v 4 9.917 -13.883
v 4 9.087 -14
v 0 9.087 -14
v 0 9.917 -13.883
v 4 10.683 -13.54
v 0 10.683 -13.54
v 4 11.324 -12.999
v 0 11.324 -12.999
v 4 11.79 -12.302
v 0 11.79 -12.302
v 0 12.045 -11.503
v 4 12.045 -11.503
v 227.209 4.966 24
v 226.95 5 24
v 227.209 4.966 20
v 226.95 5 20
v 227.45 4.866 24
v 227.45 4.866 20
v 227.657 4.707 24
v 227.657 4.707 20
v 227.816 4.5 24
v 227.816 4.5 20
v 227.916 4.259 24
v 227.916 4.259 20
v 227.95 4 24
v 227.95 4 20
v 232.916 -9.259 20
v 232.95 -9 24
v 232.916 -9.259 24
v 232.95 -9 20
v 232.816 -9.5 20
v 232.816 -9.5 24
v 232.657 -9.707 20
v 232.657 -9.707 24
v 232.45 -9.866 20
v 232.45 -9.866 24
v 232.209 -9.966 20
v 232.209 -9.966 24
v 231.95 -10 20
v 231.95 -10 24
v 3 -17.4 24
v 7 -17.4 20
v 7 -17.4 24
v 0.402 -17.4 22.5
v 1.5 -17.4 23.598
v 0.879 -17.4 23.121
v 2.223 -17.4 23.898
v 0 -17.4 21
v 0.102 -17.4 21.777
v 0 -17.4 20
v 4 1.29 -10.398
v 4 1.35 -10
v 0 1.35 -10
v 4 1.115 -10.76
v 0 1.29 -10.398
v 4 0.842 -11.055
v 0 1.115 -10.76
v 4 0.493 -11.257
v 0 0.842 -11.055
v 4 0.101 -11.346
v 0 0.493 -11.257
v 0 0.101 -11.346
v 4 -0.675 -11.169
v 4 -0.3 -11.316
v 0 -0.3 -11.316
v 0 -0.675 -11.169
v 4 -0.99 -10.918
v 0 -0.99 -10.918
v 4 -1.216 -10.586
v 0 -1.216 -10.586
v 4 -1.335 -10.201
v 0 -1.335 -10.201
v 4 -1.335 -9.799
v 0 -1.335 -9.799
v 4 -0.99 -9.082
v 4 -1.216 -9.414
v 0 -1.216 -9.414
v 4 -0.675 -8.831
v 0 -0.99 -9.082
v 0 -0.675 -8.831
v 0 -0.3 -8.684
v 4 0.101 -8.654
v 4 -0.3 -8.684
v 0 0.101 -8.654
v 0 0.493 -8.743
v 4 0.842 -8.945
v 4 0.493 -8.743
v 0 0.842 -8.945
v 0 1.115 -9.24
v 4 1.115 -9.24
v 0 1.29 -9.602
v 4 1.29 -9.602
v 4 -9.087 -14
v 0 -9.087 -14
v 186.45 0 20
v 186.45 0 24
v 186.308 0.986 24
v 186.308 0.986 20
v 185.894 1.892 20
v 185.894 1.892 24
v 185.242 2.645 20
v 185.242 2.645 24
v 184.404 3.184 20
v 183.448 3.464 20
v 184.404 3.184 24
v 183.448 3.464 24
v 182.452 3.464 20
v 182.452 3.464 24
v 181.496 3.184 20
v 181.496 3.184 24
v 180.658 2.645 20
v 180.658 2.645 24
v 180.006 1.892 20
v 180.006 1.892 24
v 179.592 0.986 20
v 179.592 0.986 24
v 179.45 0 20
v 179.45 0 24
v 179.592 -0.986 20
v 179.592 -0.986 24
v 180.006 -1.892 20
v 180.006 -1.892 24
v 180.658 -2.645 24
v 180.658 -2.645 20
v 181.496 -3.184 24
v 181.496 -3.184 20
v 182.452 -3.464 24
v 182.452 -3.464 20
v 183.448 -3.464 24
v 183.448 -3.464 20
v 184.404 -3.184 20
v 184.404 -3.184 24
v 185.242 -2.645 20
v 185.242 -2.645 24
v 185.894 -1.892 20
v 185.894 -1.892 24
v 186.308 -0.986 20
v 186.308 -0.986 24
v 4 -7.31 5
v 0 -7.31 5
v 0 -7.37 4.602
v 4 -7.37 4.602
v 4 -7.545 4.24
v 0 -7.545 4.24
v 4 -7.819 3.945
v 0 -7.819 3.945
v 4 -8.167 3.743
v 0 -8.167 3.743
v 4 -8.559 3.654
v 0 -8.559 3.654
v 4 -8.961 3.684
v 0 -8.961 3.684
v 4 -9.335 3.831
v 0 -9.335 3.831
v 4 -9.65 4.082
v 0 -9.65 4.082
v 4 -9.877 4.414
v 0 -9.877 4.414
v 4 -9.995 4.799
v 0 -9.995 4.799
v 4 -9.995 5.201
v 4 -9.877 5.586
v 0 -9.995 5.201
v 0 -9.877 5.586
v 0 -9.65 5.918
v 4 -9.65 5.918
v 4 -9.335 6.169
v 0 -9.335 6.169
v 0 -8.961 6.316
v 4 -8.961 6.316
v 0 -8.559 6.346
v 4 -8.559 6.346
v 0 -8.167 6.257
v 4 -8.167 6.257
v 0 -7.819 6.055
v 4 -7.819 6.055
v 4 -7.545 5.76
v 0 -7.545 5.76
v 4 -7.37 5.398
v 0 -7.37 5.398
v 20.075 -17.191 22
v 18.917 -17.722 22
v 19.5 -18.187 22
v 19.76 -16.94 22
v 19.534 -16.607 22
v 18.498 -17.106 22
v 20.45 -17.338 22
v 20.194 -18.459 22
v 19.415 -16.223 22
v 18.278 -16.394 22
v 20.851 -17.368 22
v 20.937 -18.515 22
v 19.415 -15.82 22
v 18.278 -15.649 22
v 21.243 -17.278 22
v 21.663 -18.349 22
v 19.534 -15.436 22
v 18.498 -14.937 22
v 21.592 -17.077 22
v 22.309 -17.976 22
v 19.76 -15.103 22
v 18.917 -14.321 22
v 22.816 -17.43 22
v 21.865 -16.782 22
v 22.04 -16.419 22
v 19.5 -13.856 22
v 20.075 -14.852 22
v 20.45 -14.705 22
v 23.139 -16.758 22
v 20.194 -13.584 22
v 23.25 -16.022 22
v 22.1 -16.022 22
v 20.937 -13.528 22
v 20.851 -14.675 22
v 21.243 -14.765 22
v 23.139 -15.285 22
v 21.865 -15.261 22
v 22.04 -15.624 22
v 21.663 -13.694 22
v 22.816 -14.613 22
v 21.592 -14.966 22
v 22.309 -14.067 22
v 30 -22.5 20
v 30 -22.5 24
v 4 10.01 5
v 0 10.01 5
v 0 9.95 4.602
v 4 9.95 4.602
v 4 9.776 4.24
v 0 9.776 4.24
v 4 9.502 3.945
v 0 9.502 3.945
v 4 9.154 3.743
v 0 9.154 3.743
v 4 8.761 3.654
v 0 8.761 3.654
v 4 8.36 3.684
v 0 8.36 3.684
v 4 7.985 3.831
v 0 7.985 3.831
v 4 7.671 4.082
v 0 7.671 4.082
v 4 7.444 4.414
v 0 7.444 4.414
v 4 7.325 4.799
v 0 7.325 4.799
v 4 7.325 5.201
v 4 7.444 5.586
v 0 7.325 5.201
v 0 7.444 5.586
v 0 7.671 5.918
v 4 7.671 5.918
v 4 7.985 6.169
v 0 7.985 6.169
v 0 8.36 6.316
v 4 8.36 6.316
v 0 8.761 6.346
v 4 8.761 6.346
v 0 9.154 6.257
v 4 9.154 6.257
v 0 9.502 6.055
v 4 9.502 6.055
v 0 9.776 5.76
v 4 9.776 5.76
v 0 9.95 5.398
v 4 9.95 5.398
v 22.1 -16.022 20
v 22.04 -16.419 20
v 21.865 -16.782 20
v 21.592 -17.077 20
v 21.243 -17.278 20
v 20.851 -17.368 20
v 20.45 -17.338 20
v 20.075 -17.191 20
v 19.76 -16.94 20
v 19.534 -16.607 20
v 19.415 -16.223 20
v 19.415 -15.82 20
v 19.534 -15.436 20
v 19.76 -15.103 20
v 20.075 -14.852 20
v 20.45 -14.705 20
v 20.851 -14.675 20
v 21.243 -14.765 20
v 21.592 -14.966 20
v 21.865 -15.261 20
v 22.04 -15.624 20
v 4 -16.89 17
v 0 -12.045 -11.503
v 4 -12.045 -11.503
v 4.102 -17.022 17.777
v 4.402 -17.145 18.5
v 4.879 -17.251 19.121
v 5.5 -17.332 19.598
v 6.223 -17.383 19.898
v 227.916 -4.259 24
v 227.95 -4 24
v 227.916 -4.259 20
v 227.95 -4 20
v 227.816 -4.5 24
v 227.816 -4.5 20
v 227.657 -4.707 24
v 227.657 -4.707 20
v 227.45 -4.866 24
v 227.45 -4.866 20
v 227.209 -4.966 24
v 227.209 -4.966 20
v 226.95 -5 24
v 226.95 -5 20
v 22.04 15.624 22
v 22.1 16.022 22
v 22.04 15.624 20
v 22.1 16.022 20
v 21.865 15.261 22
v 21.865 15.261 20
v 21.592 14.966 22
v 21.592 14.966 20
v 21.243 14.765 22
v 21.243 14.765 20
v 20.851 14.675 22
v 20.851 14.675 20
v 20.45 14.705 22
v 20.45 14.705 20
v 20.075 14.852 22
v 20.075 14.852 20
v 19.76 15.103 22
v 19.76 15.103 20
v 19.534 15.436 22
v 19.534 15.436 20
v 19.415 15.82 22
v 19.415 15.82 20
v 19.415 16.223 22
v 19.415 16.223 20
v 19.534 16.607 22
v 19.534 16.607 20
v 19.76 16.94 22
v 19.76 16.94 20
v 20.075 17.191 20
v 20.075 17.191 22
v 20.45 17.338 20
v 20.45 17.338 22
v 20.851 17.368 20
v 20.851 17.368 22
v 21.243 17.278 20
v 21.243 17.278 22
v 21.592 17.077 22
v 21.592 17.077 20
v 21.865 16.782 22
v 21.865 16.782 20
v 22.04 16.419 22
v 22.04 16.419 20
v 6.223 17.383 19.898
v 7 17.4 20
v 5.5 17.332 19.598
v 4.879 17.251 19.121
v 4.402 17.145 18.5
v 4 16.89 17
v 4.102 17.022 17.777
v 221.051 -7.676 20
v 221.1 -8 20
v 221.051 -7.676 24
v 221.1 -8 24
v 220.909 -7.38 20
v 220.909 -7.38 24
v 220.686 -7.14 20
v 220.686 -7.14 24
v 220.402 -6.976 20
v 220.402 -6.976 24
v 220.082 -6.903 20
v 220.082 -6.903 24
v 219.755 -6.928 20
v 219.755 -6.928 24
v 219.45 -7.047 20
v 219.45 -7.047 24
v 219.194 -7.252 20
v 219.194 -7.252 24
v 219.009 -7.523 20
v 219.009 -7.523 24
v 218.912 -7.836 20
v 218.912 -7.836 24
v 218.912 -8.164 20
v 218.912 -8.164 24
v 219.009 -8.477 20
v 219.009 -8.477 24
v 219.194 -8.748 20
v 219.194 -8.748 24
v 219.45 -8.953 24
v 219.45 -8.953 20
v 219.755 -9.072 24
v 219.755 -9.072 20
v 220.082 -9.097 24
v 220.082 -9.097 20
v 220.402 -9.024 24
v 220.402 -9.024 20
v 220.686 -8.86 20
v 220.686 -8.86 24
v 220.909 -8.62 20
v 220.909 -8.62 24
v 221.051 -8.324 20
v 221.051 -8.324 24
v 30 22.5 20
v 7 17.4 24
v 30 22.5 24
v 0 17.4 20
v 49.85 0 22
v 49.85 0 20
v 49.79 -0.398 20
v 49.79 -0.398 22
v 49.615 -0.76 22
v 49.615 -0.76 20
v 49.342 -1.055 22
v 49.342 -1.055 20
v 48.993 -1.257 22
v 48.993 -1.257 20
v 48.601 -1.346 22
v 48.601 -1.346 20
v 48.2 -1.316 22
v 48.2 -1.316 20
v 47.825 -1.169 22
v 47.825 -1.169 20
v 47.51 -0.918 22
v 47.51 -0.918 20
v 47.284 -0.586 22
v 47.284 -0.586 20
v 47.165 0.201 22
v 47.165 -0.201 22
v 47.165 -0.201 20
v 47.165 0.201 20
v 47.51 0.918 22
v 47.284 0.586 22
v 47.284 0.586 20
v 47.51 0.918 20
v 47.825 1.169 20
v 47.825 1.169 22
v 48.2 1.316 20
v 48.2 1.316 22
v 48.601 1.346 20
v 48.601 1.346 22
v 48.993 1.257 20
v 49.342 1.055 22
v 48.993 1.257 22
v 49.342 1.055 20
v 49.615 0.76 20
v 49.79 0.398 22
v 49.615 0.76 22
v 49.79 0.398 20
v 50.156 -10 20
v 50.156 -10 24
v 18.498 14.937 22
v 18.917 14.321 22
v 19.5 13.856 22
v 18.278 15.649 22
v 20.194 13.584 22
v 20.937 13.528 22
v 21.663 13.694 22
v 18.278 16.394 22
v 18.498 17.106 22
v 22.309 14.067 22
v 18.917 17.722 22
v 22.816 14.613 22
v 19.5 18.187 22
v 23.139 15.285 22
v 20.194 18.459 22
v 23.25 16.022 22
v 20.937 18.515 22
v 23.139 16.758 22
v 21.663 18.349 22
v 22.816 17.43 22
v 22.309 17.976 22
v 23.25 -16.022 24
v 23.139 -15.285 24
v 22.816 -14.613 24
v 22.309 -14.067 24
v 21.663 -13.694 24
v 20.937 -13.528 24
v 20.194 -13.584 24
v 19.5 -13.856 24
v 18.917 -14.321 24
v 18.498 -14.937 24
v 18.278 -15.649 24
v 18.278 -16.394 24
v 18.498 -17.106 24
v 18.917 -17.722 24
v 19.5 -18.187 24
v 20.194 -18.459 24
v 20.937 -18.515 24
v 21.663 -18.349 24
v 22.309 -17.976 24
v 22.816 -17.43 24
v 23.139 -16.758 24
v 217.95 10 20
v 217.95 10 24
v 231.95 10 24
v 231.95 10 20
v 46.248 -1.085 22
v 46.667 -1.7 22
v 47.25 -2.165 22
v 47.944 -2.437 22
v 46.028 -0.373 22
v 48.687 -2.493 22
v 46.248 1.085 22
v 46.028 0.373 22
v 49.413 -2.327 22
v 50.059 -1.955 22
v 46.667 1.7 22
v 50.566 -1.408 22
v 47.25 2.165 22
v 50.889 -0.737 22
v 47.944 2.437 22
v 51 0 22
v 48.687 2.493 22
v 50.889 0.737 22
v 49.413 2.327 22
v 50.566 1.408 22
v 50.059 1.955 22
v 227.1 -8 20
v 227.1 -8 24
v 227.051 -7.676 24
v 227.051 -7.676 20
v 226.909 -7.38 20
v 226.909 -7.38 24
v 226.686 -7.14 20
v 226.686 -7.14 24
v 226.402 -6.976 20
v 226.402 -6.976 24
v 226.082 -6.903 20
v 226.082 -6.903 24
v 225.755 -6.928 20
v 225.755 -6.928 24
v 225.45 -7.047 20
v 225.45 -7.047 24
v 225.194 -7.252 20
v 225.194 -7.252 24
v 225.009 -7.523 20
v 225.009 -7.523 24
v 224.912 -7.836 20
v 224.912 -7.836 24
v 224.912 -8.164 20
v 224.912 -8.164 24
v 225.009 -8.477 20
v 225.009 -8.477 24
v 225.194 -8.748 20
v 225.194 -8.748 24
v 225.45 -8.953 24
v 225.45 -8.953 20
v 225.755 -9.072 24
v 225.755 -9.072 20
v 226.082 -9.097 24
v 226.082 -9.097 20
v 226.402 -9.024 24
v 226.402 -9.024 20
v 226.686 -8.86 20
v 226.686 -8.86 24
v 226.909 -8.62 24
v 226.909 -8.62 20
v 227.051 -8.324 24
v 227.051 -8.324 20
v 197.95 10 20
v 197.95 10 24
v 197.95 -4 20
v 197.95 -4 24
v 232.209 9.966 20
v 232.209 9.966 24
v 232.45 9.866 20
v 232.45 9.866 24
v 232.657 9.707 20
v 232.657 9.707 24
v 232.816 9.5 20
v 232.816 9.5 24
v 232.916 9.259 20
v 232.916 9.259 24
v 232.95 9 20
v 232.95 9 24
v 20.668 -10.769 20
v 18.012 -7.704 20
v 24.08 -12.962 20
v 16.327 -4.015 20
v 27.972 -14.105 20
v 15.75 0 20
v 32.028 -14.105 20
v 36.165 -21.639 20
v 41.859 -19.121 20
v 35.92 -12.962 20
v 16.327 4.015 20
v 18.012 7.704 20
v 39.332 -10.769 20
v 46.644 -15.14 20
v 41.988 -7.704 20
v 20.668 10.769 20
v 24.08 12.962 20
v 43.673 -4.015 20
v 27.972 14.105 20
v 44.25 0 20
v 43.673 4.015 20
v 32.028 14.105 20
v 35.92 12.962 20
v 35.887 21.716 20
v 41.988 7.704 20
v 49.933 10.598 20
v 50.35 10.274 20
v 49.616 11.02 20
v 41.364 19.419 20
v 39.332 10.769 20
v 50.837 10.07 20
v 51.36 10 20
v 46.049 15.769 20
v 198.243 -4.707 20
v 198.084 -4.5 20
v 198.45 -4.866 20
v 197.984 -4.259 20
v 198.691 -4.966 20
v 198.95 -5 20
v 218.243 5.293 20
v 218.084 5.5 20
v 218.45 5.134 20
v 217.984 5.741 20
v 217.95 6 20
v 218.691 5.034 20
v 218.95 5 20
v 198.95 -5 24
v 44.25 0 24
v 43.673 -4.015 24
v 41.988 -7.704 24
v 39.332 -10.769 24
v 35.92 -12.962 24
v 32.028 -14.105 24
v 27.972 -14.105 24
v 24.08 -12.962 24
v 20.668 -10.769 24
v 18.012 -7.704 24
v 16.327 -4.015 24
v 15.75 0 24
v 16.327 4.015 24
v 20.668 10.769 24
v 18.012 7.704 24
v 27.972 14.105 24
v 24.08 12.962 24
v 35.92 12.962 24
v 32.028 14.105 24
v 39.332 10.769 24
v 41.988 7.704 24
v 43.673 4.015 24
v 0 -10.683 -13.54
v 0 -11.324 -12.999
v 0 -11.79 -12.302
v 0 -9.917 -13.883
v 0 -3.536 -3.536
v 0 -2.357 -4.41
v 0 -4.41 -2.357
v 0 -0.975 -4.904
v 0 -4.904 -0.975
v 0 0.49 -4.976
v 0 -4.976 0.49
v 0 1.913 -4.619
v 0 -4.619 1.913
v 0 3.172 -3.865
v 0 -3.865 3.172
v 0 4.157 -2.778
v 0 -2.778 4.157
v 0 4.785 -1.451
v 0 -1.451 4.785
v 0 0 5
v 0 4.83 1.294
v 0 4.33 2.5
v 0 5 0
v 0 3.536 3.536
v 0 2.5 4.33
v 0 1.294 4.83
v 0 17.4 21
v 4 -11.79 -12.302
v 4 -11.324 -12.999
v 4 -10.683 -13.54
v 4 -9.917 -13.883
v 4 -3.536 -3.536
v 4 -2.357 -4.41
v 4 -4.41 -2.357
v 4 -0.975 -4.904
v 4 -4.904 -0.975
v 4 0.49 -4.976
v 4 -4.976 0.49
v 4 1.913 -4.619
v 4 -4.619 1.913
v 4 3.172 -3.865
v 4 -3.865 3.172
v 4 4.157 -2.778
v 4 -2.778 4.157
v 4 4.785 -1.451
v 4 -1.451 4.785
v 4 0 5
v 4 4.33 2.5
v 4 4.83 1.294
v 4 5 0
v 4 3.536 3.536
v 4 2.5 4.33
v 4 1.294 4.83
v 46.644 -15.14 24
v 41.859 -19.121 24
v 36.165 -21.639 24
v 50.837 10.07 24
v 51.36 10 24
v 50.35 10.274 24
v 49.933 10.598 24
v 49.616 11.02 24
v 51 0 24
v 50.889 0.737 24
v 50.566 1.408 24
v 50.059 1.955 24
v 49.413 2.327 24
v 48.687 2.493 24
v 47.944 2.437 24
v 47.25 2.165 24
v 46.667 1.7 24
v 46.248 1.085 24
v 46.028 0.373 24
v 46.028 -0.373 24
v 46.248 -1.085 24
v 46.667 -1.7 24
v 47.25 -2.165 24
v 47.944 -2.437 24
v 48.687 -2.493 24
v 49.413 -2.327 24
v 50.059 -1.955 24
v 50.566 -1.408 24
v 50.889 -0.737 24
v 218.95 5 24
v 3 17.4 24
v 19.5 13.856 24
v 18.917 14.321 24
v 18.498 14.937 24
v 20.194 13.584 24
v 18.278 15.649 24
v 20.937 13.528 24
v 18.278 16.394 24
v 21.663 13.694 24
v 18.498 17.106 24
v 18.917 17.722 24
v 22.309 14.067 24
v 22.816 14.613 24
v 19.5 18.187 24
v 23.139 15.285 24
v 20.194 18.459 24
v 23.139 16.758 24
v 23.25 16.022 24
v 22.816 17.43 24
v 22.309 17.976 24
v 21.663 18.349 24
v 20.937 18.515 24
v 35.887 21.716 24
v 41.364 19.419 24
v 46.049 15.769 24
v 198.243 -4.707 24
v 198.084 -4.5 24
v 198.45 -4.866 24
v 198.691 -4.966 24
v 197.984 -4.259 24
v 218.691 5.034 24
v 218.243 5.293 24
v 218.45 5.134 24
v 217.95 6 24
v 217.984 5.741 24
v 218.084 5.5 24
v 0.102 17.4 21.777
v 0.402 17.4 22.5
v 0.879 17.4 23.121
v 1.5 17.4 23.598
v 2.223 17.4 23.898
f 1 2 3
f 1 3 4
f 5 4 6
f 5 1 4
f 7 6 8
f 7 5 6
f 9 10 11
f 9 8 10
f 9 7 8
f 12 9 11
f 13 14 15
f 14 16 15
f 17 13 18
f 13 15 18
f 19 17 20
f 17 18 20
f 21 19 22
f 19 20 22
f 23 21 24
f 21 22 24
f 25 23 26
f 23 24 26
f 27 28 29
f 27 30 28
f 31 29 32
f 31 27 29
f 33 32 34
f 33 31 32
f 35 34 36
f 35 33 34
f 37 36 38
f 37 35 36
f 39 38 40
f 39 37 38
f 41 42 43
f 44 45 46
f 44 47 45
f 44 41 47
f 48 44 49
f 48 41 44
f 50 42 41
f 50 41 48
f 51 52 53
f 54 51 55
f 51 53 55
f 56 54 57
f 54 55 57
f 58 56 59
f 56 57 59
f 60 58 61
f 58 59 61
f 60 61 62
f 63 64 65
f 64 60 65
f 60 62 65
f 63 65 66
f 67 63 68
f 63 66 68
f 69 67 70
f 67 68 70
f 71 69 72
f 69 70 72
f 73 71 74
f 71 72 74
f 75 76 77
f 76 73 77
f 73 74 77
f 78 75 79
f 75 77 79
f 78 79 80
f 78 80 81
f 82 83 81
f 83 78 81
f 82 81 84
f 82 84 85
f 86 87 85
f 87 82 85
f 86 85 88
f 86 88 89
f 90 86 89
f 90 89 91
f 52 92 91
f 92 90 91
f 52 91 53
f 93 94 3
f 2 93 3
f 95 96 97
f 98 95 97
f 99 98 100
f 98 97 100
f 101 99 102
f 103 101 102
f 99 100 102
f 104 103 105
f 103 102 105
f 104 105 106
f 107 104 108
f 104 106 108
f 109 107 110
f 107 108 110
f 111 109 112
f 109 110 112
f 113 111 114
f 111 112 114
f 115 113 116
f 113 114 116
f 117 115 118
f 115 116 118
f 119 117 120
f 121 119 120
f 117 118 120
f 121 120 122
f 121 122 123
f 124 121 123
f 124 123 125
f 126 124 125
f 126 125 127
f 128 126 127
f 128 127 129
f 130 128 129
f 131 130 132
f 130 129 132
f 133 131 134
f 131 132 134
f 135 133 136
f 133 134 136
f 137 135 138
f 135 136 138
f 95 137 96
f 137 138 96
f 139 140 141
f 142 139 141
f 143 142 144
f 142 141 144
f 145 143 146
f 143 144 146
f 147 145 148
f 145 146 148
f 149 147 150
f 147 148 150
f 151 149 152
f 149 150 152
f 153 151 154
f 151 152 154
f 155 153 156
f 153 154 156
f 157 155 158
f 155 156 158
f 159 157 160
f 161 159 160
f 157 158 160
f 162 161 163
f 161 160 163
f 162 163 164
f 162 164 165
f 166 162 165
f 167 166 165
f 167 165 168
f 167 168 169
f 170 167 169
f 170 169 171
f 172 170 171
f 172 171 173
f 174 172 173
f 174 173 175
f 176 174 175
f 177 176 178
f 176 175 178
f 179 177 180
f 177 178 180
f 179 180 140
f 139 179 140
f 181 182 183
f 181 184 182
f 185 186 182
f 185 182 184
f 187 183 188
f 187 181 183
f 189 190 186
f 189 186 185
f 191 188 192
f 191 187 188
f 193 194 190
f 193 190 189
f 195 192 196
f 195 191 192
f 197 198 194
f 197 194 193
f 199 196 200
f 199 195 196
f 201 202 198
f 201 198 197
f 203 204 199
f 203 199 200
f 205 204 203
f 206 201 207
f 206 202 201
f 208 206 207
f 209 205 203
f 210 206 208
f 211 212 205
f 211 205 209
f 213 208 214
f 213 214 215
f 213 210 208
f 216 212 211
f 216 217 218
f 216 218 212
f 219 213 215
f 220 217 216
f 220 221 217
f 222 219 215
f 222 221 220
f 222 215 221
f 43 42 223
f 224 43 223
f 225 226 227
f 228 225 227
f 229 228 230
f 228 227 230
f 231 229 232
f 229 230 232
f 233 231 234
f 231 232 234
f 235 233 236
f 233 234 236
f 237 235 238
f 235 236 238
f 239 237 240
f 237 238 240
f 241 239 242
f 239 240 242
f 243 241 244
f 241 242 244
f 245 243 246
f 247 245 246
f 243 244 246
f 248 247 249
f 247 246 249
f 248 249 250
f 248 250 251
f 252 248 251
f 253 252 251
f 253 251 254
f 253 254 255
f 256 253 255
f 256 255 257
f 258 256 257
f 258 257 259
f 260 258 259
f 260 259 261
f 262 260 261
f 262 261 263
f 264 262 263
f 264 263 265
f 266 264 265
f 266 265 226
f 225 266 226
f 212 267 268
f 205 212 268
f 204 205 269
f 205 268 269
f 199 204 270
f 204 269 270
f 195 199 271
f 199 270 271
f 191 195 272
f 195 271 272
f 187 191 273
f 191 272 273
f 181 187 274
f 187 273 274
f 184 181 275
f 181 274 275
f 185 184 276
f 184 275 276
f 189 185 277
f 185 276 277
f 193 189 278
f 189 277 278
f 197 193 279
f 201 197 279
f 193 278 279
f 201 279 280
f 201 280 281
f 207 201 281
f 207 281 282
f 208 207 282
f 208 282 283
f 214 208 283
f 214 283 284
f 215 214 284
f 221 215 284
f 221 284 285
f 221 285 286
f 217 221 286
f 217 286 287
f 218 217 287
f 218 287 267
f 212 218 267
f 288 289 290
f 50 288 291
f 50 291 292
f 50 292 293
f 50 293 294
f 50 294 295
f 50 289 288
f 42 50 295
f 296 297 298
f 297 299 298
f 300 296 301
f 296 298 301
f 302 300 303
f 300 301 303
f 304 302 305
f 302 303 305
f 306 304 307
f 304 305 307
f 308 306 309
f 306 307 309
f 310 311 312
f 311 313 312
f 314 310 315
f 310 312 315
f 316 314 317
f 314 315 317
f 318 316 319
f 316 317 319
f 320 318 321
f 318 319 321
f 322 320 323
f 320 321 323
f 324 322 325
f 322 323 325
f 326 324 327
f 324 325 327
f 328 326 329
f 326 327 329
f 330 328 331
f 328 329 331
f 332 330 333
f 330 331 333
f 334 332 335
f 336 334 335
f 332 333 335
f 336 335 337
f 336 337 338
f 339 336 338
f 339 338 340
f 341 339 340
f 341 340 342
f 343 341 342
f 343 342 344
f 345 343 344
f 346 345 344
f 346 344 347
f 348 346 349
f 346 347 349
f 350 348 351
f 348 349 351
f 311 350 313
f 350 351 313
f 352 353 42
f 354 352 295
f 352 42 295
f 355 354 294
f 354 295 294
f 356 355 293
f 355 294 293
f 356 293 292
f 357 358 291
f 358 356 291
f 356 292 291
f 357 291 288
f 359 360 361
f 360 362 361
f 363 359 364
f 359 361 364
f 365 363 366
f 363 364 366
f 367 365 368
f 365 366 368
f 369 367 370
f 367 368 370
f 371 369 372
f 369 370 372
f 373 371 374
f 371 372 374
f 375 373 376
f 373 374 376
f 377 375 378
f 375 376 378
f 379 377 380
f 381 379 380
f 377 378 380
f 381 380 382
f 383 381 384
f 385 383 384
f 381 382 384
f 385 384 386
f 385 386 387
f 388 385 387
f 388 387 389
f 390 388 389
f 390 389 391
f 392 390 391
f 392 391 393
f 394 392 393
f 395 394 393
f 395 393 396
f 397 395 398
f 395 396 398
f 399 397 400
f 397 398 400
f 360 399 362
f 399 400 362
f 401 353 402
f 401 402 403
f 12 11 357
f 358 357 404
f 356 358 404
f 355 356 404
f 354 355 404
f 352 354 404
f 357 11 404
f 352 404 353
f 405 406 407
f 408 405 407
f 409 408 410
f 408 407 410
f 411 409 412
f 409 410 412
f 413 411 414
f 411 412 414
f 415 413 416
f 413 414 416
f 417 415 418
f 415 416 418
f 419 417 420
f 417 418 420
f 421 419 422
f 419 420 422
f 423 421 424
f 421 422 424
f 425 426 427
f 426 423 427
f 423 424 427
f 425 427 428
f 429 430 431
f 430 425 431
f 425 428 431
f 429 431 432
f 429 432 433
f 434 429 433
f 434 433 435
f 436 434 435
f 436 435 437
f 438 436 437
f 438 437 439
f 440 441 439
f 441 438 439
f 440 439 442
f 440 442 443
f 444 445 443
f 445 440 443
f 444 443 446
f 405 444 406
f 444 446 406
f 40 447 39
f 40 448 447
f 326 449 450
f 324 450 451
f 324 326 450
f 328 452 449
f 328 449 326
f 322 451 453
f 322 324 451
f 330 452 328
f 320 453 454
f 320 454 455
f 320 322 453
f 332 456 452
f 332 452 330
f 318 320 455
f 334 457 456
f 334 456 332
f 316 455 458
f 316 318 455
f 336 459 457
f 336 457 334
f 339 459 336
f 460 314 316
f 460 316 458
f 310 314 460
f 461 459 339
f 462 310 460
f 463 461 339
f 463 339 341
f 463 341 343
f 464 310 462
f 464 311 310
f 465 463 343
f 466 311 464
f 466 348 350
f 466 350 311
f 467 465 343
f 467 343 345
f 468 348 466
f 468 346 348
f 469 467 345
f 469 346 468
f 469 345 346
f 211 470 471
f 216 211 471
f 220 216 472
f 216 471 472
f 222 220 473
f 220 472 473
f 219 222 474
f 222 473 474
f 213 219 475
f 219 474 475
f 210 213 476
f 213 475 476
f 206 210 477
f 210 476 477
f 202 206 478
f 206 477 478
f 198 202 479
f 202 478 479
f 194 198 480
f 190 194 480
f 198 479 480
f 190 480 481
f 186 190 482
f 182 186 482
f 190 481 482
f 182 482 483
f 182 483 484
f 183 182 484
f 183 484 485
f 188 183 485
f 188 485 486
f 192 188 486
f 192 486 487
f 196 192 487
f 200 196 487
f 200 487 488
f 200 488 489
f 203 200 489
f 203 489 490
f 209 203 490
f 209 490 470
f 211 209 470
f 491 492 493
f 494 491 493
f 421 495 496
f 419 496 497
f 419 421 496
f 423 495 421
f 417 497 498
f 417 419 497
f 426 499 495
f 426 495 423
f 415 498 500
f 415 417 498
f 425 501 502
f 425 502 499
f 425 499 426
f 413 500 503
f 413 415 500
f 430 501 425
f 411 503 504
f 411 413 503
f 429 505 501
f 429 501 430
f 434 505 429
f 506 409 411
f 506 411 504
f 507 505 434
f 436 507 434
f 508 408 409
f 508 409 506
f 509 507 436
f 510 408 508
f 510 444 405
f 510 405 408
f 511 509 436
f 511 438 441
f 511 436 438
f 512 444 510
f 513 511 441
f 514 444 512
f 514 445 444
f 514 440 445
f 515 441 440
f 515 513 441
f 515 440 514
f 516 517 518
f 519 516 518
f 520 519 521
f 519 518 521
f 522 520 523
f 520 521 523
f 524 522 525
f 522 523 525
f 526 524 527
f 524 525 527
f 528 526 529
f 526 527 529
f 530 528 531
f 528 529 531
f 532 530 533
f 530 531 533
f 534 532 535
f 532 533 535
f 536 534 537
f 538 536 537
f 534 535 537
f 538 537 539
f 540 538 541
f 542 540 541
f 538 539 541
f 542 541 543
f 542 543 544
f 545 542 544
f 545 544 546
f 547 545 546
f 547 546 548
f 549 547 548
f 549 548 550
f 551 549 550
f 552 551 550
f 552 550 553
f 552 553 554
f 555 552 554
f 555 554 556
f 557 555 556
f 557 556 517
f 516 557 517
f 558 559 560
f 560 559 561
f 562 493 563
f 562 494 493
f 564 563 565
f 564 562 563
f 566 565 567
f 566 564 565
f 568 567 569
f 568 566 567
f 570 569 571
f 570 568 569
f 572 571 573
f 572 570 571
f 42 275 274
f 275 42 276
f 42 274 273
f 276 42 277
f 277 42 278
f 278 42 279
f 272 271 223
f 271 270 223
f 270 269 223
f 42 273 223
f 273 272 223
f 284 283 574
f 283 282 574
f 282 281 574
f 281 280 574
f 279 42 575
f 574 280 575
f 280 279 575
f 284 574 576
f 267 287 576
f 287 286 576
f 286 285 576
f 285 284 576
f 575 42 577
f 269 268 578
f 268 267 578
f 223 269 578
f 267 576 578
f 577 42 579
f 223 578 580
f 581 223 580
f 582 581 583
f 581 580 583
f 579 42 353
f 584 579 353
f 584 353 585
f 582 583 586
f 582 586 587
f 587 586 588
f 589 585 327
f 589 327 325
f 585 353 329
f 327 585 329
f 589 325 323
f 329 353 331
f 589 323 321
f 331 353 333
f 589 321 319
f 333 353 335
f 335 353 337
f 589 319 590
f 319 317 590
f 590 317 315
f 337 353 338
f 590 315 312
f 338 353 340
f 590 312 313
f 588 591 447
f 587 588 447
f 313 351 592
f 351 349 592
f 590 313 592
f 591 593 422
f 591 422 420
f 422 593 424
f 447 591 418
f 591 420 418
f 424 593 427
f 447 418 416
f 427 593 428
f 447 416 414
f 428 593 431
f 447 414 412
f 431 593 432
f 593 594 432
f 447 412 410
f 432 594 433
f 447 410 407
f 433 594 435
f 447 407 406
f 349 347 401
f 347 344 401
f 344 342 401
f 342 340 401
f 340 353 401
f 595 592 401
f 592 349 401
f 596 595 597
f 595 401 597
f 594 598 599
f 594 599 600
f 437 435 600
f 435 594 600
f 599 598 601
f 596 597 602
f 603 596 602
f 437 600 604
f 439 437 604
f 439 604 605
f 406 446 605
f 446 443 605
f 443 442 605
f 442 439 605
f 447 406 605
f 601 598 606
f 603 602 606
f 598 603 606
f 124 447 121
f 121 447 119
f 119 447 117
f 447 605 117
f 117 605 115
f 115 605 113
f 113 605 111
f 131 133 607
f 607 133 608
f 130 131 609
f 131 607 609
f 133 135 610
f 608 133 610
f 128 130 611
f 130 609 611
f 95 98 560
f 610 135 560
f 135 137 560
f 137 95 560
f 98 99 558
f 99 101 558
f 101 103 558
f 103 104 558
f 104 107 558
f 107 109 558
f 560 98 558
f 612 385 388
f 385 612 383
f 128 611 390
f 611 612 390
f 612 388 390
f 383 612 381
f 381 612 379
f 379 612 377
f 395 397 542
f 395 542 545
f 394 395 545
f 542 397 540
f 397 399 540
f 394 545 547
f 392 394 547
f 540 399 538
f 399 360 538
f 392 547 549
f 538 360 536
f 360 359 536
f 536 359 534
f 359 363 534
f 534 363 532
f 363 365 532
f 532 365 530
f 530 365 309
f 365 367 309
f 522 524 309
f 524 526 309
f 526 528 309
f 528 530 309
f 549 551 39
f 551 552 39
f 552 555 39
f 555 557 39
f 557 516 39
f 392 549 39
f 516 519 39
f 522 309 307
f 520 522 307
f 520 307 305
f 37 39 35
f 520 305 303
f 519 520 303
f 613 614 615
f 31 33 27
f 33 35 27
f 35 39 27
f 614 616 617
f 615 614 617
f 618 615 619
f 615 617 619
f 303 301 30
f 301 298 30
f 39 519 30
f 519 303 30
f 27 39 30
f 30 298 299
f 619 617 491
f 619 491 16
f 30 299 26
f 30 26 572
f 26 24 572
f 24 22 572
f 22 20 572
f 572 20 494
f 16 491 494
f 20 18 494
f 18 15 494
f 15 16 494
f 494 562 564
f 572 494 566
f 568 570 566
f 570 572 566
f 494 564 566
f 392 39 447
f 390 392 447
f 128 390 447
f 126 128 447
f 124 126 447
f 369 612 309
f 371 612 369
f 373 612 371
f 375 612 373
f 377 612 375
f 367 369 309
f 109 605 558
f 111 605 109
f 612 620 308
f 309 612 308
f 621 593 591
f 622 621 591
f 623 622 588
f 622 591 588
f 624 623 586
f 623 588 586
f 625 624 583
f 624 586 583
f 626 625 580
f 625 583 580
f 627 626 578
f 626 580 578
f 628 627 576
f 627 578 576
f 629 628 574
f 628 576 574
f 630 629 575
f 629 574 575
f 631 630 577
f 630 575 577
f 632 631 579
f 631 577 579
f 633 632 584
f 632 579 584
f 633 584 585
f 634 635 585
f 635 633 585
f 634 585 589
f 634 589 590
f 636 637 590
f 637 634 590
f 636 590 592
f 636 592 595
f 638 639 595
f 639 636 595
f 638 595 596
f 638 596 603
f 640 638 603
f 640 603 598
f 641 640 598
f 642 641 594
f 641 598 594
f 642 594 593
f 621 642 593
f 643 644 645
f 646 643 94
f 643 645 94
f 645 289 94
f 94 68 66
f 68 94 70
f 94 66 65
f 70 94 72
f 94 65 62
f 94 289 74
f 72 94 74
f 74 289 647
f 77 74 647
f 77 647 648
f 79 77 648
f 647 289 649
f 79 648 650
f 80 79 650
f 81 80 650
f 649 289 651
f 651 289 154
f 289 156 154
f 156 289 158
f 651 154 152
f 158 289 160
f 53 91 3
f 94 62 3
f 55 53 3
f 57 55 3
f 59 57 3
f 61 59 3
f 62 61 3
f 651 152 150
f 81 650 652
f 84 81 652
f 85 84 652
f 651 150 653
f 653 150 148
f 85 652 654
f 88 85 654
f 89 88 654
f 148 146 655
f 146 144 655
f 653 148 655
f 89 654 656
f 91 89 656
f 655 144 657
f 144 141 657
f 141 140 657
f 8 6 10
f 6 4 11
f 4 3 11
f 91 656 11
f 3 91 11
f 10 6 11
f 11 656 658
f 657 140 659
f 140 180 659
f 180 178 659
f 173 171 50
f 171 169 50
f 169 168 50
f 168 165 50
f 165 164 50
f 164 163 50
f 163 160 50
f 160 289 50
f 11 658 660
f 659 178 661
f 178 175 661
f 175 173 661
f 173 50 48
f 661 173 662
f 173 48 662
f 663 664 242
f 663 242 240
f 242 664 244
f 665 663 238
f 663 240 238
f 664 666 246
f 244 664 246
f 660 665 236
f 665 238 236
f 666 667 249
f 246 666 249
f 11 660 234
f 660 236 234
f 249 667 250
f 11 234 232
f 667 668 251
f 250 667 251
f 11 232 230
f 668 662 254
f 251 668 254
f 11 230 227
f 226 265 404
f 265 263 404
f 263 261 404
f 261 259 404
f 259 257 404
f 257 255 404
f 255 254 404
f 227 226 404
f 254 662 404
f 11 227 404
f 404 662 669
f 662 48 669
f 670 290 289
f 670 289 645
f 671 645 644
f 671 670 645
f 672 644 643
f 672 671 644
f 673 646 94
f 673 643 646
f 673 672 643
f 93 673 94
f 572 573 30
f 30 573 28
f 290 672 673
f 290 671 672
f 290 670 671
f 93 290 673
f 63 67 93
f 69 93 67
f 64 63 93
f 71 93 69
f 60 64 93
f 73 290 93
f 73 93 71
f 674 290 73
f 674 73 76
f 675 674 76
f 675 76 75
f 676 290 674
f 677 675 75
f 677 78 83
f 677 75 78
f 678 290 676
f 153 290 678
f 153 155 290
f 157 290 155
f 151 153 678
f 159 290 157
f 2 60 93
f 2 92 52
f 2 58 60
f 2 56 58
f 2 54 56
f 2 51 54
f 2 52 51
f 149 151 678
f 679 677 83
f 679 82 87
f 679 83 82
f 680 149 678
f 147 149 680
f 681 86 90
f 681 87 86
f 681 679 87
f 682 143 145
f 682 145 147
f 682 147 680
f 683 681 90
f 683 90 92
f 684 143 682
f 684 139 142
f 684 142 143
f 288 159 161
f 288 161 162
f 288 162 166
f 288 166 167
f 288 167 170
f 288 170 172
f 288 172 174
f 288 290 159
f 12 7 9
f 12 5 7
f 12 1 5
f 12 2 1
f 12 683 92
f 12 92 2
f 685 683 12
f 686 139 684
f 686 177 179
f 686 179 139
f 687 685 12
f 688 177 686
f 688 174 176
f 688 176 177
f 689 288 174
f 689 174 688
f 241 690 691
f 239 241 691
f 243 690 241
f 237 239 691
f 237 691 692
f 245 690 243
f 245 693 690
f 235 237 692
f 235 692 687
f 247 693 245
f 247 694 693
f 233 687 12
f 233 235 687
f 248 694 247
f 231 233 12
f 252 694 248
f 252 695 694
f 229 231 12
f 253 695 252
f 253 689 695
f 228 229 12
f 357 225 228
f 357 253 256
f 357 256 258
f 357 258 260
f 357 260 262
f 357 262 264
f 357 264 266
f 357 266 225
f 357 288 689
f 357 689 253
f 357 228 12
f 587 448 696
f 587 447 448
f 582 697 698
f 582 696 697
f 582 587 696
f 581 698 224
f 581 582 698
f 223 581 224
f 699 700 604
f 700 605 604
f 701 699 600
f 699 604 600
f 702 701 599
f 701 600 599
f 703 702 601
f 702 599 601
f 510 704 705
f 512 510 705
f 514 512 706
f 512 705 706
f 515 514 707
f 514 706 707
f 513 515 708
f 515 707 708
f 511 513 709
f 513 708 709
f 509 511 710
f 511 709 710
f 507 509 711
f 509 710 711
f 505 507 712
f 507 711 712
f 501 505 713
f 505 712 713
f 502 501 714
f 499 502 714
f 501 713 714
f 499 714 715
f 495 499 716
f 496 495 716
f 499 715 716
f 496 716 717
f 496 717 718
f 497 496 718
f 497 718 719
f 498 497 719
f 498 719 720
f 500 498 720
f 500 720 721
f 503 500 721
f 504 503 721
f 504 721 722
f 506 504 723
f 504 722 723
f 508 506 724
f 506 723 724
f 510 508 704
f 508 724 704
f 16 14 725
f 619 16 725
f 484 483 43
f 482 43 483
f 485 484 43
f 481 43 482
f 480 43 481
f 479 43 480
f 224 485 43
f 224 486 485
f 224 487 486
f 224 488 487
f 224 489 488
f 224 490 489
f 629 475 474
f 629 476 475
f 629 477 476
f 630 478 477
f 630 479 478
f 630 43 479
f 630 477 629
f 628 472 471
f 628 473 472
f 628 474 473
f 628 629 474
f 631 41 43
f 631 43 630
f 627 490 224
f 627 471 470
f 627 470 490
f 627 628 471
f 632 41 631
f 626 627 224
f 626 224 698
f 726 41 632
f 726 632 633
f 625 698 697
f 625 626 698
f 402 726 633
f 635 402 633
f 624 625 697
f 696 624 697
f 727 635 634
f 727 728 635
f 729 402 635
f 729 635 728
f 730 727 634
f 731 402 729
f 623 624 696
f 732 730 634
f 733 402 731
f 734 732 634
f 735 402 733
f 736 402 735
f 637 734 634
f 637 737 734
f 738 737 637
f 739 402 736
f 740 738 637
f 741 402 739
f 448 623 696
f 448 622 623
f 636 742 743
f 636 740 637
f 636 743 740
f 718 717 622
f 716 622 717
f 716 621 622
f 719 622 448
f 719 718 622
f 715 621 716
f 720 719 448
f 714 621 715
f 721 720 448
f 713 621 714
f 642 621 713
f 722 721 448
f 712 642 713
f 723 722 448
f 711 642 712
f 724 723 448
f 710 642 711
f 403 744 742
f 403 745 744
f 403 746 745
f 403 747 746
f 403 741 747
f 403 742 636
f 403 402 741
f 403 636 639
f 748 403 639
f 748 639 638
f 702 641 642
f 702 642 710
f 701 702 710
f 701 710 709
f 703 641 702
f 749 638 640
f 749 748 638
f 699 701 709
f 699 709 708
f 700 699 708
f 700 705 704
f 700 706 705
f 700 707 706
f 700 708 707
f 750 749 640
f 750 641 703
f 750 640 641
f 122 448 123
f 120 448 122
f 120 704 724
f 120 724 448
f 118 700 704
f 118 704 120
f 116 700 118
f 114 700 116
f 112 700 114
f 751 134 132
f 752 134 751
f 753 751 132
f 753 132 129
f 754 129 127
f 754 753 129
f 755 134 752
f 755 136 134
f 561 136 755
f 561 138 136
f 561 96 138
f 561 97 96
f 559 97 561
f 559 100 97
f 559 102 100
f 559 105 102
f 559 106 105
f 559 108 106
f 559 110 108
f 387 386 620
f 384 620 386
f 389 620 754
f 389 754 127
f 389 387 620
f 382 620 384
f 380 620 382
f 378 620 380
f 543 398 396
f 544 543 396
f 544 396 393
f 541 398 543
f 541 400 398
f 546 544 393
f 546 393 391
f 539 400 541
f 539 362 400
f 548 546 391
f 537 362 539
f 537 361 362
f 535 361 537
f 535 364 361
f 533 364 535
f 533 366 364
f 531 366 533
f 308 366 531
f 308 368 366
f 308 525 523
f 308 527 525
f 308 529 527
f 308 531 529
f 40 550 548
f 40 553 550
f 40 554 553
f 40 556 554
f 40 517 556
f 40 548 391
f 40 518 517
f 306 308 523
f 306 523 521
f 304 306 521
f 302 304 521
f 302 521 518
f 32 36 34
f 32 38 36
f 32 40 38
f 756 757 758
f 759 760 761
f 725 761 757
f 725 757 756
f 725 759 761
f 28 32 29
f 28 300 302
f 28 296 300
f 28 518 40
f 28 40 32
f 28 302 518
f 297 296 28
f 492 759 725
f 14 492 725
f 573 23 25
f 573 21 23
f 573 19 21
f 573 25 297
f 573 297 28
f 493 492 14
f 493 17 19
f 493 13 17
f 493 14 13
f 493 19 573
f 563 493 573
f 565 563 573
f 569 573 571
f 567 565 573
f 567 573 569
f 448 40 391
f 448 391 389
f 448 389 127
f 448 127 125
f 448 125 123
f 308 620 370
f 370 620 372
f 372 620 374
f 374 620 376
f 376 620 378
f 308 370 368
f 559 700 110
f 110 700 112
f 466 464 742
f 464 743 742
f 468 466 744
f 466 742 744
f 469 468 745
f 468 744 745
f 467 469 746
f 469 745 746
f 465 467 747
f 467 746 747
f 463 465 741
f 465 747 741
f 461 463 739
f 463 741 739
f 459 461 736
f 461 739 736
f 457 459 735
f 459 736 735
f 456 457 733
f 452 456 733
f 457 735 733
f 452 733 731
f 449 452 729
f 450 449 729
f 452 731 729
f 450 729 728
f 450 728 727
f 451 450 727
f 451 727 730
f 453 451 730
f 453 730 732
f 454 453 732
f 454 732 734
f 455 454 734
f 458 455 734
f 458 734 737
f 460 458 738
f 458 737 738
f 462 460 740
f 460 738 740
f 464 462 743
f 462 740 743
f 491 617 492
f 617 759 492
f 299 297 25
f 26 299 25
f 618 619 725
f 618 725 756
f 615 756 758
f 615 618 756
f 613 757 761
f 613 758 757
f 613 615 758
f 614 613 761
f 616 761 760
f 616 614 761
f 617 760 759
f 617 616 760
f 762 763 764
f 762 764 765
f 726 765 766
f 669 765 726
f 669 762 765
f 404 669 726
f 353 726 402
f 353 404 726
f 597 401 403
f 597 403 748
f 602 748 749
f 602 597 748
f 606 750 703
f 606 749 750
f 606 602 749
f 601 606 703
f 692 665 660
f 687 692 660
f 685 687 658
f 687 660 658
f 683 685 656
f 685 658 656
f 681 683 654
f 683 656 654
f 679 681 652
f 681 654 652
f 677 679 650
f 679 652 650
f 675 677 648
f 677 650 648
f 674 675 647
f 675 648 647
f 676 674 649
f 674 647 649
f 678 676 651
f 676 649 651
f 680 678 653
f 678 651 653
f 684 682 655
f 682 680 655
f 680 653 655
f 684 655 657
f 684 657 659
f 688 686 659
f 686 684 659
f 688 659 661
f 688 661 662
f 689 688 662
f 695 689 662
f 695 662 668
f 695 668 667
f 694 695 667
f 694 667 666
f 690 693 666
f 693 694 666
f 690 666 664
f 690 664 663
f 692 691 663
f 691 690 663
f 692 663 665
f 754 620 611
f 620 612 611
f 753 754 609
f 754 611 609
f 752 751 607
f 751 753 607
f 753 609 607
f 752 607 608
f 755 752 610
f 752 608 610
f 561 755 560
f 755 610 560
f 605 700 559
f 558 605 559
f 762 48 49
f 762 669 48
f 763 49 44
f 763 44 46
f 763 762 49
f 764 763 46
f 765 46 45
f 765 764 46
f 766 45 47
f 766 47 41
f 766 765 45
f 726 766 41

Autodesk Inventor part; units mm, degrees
ref_plane "YZ Plane" through (0, 0, 0) normal (1, 0, 0) x (0, 1, 0)
ref_plane "XZ Plane" through (0, 0, 0) normal (0, 1, 0) x (-1, 0, 0)
ref_plane "XY Plane" through (0, 0, 0) normal (0, 0, 1) x (1, 0, 0)
sketch "スケッチ1" plane through (0, 0, 0) normal (1, 0, 0) x (0, 1, 0)
  circle A0 centre (0, 0) radius 10
  circle A1 centre (0, -10) radius 1.35
  circle A2 centre (8.6603, 5) radius 1.35
  circle A3 centre (-8.6603, 5) radius 1.35
  circle A4 centre (0, 0) radius 5
  line L0 (0, 0) -> (0, 50)
  circle A5 centre (0, 50) radius 22.5
  circle A6 centre (0, 0) radius 14
  line L1 (-14, 0) -> (-22.5, 50)
  line L2 (14, 0) -> (22.5, 50)
  line L3 (0, -14) -> (-11.62, -14)
  line L4 (-11.62, -14) -> (-14, 0)
  line L5 (0, -14) -> (11.62, -14)
  line L6 (11.62, -14) -> (14, 0)
  line L7 (0, 20) -> (-17.4, 20)
  line L8 (0, 20) -> (17.4, 20)
  dimension "d0" = 20
  dimension "d1" = 2.7
  dimension "d4" = 360
  dimension "d6" = 10
  dimension "d7" = 50
  dimension "d8" = 45
  dimension "d9" = 28
extrude "押し出し1" add sketch "スケッチ1" along normal blind 4 contours A0 A1 A3 A2 | A6 L6 L4 | A6 L1 L7 L0 | L0 L8 L2 A6 | L6 L5 A6 | A6 L3 L4
sketch "スケッチ2" plane through (0, -17.4, 20) normal (0, 0, 1) x (1, 0, 0)
  line L0 (0, 17.4) -> (30, 17.4)
  circle A0 centre (30, 17.4) radius 22.5
  circle A1 centre (30, 17.4) radius 18.5
  circle A2 centre (30, 17.4) radius 14.25
  circle A3 centre (48.5, 17.4) radius 1.35
  circle A4 centre (20.75, 33.4215) radius 1.35
  circle A5 centre (20.75, 1.3785) radius 1.35
  line L1 (0, 29.02) -> (0, 34.8) projected
  line L2 (0, 0) -> (0, 5.78) projected
  line L3 (0, 34.8) -> (0, 0)
  line L4 (4, 29.02) -> (4, 34.8) projected
  line L5 (4, 34.8) -> (7, 34.8)
  line L6 (7, 34.8) -> (30, 39.9)
  line L7 (4, 0) -> (4, 5.78) projected
  line L8 (4, 0) -> (7, 0)
  line L9 (7, 0) -> (30, -5.1)
  line L10 (4, 0) -> (0, 0)
  line L11 (0, 34.8) -> (4, 34.8) projected
  line L12 (0, 0) -> (0, 34.8)
  line L13 (0, 34.8) -> (4, 34.8)
  dimension "d14" = 37
  dimension "d12" = 30
  dimension "d13" = 45
  dimension "d15" = 28.5
  dimension "d16" = 2.7
  dimension "d19" = 360
  dimension "d21" = 3
  dimension "d22" = 3
extrude "押し出し2" add sketch "スケッチ2" along normal blind 4 contours L3 L1 L11 L5 L6 A0 L0 | L0 A0 L9 L8 L10 L2 L3 | A1 A4 A3 A5 | A0 L6 L9
fillet "フィレット1" radius 3 2 edges at (4, 0, 20) (0, 0, 24)
fillet "フィレット2" radius 3 2 edges at (2, -11.62, -14) (2, 11.62, -14)
sketch "スケッチ7" plane through (0, -17.4, 24) normal (0, 0, 1) x (1, 0, 0)
  circle A0 centre (30, 17.4) radius 14.25 projected
  line L0 (30, 17.4) -> (182.95, 17.4)
  line L1 (30, 17.4) -> (182.95, 17.4) construction
  circle A1 centre (182.95, 17.4) radius 3.5
  circle A2 centre (182.95, 17.4) radius 10
  line L2 (182.95, 27.4) -> (50.1556, 27.4)
  arc A3 (30, -5.1) -> (30, 39.9) centre (30, 17.4) ccw projected
  line L3 (182.95, 27.4) -> (315.7444, 27.4) construction
  line L4 (182.95, 7.4) -> (50.1556, 7.4)
  point P0 (0, 17.4)
  dimension "d55" = 152.95
  dimension "d56" = 0
  dimension "d57" = 7
  dimension "d58" = 20
  dimension "d59" = 180
extrude "押し出し7" add sketch "スケッチ7" against normal blind 4 contours A3 L2 A2 L0 | L0 A2 L4 A3 | A2
sketch "スケッチ8" plane through (0, -17.4, 24) normal (0, 0, 1) x (1, 0, 0)
  circle A0 centre (20.75, 33.4215) radius 1.35 projected
  circle A1 centre (20.75, 33.4215) radius 2.5
  circle A2 centre (48.5, 17.4) radius 1.35 projected
  circle A3 centre (48.5, 17.4) radius 2.5
  circle A4 centre (20.75, 1.3785) radius 1.35 projected
  circle A5 centre (20.75, 1.3785) radius 2.5
  point P0 (0, 17.4)
  dimension "d63" = 5
  dimension "d64" = 5
  dimension "d65" = 5
extrude "押し出し8" cut sketch "スケッチ8" against normal blind 2 contours A0 | A1 | A3 | A4 | A5
fillet "フィレット4" radius 2 1 edges at (50.1556, 10, 22)
sketch "スケッチ12" plane through (0, -17.4, 24) normal (0, 0, 1) x (1, 0, 0)
  circle A0 centre (48.5, 17.4) radius 2.5 projected
  circle A1 centre (20.75, 1.3785) radius 2.5 projected
  circle A2 centre (20.75, 33.4215) radius 2.5 projected
  circle A3 centre (182.95, 17.4) radius 3.5 projected
  line L0 (3, 0) -> (3, 34.8) projected
  line L1 (3, 0) -> (7, 0) projected
  line L2 (7, 0) -> (30, -5.1) projected
  arc A4 (30, -5.1) -> (50.1556, 7.4) centre (30, 17.4) ccw projected
  line L3 (50.1556, 7.4) -> (182.95, 7.4) projected
  arc A5 (182.95, 7.4) -> (182.95, 27.4) centre (182.95, 17.4) ccw projected
  line L4 (182.95, 27.4) -> (51.36, 27.4) projected
  arc A6 (49.6163, 28.4204) -> (51.36, 27.4) centre (51.36, 29.4) ccw projected
  arc A7 (49.6163, 28.4204) -> (30, 39.9) centre (30, 17.4) ccw projected
  line L5 (30, 39.9) -> (7, 34.8) projected
  line L6 (7, 34.8) -> (3, 34.8) projected
  circle A8 centre (30, 17.4) radius 14.25 projected
  line L7 (182.95, 7.4) -> (232.95, 7.4)
  line L8 (182.95, 27.4) -> (232.95, 27.4)
  line L9 (232.95, 27.4) -> (232.95, 7.4)
  point P0 (0, 17.4)
  dimension "d92" = 50
  dimension "d93" = 50
extrude "押し出し12" add sketch "スケッチ12" against normal blind 4 contours A5 L8 L9 L7
sketch "スケッチ14" plane through (0, -17.4, 24) normal (0, 0, 1) x (1, 0, 0)
  circle A0 centre (30, 17.4) radius 14.25 projected
  line L0 (232.95, 27.4) -> (51.36, 27.4) projected
  arc A1 (49.6163, 28.4204) -> (51.36, 27.4) centre (51.36, 29.4) ccw projected
  arc A2 (49.6163, 28.4204) -> (30, 39.9) centre (30, 17.4) ccw projected
  line L1 (30, 39.9) -> (7, 34.8) projected
  line L2 (7, 34.8) -> (3, 34.8) projected
  line L3 (3, 0) -> (3, 34.8) projected
  line L4 (3, 0) -> (7, 0) projected
  line L5 (7, 0) -> (30, -5.1) projected
  arc A3 (30, -5.1) -> (50.1556, 7.4) centre (30, 17.4) ccw projected
  line L6 (50.1556, 7.4) -> (232.95, 7.4) projected
  circle A4 centre (182.95, 17.4) radius 3.5 projected
  circle A5 centre (20.75, 33.4215) radius 2.5 projected
  circle A6 centre (20.75, 1.3785) radius 2.5 projected
  circle A7 centre (48.5, 17.4) radius 2.5 projected
  line L7 (197.95, 27.4) -> (197.95, 12.4)
  line L8 (197.95, 12.4) -> (227.95, 12.4)
  line L9 (227.95, 12.4) -> (227.95, 22.4)
  line L10 (227.95, 22.4) -> (217.95, 22.4)
  line L11 (217.95, 22.4) -> (217.95, 27.4)
  line L12 (232.95, 7.4) -> (232.95, 27.4) projected
  point P0 (0, 17.4)
  dimension "d110" = 10
  dimension "d113" = 30
  dimension "d118" = 5
  dimension "d119" = 5
  dimension "d120" = 5
  dimension "d121" = 5
extrude "押し出し14" cut sketch "スケッチ14" against normal blind 4 contours L11 L10 L9 L8 L7 L0
fillet "フィレット8" radius 1 6 edges at (197.95, -5, 22) (232.95, 10, 22) (232.95, -10, 22) (217.95, 5, 22) (227.95, -5, 22) (227.95, 5, 22)
sketch "スケッチ15" plane through (0, -17.4, 24) normal (0, 0, 1) x (1, 0, 0)
  circle A0 centre (226, 9.4) radius 1.1
  circle A1 centre (220, 9.4) radius 1.1
  line L0 (0, 0) -> (0, 5.3555) projected
  line L1 (0, 0) -> (240, 0)
  line L2 (50.1556, 7.4) -> (231.95, 7.4) projected
  line L3 (0, 0) -> (240, 0) construction
  point P0 (0, 17.4)
  dimension "d123" = 2.2
  dimension "d124" = 2.2
  dimension "d130" = 240
  dimension "d131" = 0
  dimension "d132" = 9.4
  dimension "d133" = 9.4
  dimension "d134" = 6
extrude "押し出し15" cut sketch "スケッチ15" against normal blind 10
properties part number "motor_holder_8-5" material "ABS プラスチック"
